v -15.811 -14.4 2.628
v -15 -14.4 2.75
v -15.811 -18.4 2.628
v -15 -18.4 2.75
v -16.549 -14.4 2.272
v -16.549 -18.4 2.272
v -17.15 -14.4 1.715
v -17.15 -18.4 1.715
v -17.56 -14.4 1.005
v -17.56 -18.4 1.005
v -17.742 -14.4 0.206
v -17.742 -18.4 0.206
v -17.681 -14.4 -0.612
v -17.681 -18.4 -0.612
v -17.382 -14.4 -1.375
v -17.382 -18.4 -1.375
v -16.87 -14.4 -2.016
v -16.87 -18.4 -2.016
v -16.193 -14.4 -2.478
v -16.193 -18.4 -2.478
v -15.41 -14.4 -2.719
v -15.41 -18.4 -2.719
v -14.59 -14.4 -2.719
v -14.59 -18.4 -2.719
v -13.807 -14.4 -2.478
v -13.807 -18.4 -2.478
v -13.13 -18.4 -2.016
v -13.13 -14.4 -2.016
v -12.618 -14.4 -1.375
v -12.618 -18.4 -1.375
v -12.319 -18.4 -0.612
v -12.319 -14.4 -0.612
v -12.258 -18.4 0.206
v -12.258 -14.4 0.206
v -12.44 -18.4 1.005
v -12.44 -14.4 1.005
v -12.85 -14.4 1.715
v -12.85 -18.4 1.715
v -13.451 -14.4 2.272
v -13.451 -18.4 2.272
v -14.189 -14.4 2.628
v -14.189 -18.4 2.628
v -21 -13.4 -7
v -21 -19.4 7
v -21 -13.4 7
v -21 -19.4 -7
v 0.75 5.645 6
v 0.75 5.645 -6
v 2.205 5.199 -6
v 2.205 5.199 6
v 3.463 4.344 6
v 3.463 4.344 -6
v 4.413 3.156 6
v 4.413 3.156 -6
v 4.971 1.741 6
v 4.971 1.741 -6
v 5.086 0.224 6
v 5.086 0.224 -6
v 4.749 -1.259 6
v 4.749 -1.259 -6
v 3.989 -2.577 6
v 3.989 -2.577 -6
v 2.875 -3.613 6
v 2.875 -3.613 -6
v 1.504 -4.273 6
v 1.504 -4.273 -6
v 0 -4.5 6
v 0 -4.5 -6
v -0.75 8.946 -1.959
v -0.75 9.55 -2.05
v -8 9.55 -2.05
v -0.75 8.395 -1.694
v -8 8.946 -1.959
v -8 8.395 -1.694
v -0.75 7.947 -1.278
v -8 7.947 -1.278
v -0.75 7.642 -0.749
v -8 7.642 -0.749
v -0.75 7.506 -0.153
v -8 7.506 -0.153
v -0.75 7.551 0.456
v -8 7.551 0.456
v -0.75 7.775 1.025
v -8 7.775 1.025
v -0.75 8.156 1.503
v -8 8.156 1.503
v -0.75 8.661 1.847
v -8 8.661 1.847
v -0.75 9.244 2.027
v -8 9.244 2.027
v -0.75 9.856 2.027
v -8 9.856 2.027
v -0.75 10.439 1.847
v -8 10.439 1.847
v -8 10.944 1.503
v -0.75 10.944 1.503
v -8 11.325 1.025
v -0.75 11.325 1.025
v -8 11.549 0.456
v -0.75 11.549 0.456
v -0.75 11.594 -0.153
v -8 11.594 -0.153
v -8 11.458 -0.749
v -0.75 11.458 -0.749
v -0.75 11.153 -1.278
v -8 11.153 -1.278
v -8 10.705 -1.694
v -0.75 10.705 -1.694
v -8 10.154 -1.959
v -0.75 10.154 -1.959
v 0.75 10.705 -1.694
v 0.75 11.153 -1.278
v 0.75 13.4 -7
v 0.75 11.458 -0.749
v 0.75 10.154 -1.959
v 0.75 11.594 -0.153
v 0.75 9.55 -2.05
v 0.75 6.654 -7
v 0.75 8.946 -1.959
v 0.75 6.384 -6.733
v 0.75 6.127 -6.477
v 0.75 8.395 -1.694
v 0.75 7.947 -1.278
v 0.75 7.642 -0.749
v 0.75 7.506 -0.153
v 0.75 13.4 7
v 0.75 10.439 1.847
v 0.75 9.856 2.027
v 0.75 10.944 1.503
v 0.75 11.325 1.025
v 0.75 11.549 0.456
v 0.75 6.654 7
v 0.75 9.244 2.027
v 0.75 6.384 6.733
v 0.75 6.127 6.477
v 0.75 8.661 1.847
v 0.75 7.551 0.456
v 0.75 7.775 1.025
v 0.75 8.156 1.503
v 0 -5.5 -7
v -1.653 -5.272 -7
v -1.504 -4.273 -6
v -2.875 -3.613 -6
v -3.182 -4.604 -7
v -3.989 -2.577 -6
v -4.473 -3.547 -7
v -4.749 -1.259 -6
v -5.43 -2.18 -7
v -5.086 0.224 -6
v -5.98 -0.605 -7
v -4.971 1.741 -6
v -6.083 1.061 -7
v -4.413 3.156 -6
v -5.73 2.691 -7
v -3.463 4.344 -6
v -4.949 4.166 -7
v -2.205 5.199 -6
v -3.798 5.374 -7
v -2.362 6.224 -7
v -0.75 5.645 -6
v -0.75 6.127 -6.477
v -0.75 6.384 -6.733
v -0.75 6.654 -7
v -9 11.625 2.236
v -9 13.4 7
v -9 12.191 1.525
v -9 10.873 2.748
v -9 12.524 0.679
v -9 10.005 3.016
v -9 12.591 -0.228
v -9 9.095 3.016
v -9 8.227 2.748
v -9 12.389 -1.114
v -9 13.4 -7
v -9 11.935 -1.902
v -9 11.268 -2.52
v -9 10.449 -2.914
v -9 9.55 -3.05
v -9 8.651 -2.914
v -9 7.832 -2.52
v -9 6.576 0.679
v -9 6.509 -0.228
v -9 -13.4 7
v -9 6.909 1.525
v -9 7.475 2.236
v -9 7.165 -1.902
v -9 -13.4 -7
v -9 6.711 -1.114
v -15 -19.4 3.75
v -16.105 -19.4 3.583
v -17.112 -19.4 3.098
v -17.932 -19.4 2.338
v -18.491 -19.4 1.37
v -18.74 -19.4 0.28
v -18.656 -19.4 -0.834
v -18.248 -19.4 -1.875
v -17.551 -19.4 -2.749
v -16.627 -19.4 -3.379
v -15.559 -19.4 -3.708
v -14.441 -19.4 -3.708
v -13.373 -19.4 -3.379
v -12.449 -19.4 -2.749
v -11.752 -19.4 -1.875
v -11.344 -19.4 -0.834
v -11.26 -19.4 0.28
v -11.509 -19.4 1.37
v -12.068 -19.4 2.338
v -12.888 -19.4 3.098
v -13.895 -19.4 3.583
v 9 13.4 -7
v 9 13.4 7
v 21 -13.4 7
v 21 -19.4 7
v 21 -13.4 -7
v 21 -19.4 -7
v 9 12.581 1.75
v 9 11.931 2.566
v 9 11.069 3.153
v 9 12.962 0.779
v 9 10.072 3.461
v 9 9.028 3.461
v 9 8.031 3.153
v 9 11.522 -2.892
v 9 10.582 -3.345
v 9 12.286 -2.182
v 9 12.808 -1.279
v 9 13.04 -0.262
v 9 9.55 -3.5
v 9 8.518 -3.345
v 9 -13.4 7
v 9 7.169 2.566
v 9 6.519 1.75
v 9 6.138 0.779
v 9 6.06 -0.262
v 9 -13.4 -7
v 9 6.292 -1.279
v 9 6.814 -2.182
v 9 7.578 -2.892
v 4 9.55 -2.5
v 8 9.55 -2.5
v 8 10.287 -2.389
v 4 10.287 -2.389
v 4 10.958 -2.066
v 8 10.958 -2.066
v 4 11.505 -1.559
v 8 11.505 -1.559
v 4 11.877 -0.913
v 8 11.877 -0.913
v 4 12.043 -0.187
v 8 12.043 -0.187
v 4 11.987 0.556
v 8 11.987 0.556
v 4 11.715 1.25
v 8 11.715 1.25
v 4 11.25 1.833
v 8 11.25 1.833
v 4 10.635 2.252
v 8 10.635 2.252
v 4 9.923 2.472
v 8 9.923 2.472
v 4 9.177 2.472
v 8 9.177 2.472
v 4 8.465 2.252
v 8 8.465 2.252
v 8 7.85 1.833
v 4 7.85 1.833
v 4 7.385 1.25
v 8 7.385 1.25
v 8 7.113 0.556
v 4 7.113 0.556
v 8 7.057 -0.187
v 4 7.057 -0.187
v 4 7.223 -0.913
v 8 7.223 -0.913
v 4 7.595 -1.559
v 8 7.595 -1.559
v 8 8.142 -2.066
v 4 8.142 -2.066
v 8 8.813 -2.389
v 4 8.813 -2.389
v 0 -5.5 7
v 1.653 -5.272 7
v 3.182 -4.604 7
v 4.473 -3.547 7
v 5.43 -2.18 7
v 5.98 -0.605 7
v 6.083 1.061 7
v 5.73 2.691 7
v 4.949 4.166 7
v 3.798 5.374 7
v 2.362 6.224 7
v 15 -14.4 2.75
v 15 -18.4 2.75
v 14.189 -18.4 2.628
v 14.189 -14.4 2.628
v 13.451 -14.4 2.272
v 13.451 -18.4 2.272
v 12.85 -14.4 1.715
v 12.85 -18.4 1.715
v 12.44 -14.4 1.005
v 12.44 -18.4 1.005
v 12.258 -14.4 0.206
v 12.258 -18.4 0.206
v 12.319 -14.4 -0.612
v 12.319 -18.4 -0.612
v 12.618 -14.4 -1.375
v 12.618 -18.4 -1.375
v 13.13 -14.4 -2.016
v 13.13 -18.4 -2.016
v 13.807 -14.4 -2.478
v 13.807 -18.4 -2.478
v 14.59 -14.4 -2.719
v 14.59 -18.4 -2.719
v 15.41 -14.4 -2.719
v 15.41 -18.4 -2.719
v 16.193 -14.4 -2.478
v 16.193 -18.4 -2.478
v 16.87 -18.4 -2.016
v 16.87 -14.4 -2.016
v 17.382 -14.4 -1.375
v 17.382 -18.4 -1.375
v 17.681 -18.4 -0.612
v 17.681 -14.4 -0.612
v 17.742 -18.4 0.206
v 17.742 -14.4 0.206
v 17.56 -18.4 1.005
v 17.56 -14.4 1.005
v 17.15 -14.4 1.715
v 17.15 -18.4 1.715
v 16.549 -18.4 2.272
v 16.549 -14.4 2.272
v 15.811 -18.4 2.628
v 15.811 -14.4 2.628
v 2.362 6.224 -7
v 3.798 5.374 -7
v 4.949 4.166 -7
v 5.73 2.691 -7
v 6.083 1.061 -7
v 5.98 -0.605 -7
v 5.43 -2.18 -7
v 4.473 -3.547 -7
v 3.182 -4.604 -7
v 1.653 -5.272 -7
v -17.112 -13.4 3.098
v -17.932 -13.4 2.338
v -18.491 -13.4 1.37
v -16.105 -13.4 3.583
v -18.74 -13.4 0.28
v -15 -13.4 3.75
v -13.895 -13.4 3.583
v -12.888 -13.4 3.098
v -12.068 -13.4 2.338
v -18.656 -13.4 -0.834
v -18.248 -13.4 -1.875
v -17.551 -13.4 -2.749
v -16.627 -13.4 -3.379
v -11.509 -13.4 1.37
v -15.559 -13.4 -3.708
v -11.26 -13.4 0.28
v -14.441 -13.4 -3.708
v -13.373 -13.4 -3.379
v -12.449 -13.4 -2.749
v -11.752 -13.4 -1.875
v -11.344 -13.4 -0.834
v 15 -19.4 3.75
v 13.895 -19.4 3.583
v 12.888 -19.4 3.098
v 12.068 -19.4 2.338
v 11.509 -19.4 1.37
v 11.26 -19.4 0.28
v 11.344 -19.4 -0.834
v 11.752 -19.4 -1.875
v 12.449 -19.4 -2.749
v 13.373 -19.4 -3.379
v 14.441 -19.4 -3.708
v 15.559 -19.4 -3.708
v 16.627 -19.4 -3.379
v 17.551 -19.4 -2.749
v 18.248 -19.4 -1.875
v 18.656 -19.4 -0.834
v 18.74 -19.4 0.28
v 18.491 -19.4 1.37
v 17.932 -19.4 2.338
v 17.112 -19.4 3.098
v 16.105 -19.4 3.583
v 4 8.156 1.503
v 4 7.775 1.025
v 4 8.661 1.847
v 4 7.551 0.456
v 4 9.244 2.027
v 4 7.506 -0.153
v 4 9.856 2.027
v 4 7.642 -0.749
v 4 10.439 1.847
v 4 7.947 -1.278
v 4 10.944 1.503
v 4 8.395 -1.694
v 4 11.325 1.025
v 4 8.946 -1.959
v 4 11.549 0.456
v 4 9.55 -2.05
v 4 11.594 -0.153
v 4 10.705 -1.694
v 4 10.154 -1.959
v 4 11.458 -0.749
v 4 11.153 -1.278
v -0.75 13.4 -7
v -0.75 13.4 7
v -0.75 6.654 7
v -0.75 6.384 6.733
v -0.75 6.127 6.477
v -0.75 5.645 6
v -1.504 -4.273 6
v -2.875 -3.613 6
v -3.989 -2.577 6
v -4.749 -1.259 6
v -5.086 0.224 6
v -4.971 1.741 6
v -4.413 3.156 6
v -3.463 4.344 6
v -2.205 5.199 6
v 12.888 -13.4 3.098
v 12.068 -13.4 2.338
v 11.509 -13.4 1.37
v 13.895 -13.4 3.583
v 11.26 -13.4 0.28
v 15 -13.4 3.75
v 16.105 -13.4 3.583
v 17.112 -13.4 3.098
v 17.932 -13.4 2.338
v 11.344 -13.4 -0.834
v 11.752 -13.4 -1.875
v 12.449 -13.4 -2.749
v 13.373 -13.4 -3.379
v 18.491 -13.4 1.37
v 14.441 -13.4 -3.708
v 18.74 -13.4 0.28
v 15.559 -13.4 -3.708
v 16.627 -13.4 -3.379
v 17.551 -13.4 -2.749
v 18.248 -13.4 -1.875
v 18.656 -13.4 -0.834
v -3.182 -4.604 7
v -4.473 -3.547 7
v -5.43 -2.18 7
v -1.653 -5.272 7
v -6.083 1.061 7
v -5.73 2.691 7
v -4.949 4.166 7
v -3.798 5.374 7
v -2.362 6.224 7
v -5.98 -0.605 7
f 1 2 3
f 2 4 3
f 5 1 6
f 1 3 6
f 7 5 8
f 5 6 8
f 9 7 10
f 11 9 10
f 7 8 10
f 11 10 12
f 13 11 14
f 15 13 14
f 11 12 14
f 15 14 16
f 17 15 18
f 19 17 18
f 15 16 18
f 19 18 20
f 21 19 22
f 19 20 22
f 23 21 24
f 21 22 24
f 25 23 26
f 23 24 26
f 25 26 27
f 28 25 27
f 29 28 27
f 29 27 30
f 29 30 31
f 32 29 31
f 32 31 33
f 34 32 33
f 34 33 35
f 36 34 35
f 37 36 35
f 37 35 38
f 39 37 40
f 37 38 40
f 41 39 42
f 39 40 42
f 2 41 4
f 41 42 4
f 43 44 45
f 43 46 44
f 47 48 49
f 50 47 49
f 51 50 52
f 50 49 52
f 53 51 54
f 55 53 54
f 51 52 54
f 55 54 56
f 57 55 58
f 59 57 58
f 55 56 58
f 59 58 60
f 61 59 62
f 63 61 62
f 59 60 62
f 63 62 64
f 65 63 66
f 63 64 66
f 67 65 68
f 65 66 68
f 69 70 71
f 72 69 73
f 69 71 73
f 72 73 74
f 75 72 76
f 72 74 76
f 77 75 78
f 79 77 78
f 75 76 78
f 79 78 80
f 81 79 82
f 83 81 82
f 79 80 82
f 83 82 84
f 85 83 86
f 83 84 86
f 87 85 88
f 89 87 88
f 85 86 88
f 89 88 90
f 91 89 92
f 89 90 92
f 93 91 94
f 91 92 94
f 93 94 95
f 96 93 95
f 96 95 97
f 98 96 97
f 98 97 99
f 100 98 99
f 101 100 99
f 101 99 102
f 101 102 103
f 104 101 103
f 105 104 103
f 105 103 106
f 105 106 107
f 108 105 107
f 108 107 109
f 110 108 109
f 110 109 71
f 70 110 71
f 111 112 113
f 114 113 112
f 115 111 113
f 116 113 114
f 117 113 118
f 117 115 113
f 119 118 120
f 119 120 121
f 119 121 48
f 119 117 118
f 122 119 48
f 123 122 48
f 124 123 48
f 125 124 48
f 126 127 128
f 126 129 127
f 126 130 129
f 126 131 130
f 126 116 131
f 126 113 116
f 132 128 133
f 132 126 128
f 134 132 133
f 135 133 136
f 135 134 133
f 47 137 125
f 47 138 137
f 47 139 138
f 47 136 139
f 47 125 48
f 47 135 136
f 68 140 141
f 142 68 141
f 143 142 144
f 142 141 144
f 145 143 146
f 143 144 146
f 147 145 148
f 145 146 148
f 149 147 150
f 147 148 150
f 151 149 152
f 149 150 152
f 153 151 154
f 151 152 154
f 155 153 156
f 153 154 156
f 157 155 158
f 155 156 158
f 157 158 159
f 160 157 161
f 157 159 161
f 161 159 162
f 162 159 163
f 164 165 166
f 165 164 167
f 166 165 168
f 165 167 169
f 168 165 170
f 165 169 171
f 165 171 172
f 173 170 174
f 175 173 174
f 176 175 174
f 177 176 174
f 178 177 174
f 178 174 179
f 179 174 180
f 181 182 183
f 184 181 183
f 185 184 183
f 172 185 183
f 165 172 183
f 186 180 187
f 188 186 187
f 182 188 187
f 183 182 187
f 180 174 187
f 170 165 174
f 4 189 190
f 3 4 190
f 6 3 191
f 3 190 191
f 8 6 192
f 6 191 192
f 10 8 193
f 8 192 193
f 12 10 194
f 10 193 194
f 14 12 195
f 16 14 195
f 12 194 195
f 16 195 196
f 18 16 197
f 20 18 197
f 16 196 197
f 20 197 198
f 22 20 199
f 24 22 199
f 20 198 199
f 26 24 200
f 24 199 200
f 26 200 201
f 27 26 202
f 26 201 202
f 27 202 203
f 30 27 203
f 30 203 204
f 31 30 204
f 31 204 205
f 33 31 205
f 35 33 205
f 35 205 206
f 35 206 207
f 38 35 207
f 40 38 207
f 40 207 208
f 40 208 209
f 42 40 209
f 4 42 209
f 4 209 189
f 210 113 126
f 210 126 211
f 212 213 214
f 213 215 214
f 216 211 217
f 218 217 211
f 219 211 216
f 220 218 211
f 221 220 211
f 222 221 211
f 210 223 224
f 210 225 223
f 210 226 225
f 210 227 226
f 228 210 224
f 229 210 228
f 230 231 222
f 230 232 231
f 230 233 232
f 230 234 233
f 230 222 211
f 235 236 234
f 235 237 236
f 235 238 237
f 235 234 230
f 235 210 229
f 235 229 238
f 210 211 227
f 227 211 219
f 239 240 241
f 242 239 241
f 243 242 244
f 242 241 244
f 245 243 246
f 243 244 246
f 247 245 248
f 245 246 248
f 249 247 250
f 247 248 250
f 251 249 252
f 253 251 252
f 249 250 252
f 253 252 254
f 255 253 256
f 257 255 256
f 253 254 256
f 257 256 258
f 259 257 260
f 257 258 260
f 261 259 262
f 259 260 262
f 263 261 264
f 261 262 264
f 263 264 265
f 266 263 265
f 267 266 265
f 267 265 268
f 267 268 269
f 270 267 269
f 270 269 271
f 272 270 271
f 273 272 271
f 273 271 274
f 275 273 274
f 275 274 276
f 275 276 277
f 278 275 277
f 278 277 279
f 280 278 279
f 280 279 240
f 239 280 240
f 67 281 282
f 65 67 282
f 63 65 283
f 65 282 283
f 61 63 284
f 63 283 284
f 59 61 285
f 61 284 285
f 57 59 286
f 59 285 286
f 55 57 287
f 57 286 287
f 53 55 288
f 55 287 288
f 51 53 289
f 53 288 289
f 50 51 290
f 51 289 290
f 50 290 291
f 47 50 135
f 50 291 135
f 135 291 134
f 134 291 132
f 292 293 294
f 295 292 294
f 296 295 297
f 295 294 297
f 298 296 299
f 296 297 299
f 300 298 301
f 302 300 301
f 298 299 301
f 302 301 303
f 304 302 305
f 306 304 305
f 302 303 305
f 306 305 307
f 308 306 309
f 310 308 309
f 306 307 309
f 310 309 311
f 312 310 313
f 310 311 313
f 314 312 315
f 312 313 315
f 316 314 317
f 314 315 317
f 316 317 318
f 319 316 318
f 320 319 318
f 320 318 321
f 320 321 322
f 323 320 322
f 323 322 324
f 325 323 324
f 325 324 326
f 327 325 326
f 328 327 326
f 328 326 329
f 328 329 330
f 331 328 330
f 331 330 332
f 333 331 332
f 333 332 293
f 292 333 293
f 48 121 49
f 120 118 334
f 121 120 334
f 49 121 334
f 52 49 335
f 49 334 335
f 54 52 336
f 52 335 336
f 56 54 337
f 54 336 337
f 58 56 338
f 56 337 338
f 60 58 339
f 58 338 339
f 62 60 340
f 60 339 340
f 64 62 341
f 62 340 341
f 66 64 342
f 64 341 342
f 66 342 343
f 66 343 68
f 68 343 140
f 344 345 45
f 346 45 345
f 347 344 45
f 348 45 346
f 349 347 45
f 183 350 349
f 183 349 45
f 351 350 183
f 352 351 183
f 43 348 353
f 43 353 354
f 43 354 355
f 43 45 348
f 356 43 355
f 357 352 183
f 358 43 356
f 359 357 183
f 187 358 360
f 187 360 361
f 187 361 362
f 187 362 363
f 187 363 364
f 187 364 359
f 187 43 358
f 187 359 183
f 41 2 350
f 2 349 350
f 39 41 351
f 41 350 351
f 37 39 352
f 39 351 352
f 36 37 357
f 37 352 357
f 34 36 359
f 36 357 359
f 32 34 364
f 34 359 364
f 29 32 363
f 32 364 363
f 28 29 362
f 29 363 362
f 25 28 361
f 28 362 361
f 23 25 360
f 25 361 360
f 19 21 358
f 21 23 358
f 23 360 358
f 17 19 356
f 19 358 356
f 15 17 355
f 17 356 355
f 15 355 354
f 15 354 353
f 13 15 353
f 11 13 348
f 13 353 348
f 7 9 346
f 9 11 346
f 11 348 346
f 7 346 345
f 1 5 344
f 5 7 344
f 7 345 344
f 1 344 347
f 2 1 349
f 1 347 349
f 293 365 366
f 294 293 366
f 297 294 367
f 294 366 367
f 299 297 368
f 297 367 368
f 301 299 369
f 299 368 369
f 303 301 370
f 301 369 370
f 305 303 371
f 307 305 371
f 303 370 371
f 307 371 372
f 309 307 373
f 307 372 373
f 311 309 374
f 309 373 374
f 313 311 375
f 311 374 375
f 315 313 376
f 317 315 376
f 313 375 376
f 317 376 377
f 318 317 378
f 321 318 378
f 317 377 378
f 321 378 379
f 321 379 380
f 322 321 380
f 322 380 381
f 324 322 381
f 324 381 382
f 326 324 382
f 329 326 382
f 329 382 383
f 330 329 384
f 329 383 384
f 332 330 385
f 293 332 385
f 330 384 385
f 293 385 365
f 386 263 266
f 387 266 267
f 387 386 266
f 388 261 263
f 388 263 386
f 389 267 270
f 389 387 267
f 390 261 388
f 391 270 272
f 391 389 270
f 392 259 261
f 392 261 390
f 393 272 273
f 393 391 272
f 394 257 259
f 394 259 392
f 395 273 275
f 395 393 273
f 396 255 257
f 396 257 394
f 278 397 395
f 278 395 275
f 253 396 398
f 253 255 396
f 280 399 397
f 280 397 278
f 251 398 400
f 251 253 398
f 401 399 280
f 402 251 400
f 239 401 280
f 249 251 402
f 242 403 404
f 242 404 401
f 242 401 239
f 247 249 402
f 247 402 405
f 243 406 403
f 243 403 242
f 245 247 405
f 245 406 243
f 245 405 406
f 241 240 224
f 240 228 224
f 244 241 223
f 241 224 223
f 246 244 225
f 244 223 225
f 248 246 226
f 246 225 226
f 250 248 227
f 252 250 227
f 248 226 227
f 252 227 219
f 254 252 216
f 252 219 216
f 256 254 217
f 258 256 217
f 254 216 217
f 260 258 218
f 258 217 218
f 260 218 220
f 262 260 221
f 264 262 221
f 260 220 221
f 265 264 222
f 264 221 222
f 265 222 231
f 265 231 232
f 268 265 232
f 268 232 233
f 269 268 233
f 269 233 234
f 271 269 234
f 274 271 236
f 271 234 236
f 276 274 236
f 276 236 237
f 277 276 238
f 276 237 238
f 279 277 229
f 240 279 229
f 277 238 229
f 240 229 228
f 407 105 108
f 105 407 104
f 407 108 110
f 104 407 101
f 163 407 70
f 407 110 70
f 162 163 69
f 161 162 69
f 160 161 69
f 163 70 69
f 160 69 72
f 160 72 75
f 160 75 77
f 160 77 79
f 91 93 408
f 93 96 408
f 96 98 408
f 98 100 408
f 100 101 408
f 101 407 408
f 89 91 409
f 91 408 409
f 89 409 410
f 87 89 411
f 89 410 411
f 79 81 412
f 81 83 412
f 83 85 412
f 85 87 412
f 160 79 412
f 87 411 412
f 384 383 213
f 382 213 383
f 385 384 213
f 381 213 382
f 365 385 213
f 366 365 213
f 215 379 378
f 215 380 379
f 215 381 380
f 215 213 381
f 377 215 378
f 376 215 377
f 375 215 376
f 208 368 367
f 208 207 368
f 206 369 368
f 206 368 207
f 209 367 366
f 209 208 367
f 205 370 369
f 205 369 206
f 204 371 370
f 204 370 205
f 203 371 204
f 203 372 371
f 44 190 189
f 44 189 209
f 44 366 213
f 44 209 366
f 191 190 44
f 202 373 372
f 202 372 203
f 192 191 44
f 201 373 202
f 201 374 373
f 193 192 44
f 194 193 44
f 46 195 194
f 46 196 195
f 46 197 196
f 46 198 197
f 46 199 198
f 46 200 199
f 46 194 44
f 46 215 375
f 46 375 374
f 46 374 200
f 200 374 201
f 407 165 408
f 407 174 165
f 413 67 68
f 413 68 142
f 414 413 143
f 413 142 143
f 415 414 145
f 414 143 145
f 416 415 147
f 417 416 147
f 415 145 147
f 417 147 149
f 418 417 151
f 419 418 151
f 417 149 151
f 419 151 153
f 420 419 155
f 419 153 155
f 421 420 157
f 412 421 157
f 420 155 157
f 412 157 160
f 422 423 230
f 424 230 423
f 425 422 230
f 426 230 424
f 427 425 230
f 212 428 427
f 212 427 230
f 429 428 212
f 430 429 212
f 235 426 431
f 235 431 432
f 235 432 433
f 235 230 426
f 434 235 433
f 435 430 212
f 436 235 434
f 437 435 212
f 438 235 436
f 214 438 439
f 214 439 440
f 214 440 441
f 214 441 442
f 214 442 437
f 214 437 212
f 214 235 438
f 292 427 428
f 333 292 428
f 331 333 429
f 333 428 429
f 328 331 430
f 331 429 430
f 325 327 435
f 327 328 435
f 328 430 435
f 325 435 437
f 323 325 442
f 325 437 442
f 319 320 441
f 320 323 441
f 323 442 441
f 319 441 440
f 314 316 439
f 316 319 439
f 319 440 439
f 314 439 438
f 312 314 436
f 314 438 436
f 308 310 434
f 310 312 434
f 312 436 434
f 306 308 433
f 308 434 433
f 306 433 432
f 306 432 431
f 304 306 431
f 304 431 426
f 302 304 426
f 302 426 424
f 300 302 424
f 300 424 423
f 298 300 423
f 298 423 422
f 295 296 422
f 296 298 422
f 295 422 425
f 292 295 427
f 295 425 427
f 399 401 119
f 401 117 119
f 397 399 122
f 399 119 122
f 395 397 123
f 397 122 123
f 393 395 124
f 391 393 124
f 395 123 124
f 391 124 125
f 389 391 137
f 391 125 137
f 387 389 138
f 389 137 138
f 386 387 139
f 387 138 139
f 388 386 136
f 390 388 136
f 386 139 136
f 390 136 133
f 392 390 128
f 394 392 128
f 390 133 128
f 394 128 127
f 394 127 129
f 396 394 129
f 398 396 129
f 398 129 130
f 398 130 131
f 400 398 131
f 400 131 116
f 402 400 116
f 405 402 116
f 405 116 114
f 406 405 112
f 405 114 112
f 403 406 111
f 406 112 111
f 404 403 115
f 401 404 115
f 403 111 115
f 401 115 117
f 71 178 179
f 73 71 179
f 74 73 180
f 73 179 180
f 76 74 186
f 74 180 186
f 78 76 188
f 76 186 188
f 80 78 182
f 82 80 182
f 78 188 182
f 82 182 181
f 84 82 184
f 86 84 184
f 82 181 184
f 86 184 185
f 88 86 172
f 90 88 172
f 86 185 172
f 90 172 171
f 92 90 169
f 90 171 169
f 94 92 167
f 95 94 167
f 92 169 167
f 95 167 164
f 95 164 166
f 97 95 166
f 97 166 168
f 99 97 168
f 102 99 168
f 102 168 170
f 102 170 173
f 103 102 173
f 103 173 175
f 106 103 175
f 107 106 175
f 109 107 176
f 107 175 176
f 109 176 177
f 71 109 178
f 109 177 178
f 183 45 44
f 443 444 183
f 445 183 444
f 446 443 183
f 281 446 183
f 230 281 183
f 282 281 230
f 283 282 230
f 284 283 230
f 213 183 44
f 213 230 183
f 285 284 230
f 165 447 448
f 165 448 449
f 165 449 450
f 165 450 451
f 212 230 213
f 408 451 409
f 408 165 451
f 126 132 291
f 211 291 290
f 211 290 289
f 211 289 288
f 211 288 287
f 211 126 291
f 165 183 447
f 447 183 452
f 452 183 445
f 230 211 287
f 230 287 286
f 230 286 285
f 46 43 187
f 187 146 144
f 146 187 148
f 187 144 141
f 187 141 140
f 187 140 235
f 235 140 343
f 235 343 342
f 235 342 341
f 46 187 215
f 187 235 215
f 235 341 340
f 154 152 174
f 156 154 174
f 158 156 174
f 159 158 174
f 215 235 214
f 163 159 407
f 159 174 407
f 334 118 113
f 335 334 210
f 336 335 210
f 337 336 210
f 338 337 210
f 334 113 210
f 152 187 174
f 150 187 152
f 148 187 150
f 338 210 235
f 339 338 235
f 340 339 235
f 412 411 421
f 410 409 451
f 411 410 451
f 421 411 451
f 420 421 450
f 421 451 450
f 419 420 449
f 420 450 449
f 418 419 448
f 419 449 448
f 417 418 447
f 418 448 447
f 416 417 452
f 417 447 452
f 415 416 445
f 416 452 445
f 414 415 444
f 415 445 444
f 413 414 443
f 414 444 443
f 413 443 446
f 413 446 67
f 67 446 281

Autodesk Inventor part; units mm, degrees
ref_plane "YZ Plane" through (0, 0, 0) normal (1, 0, 0) x (0, 1, 0)
ref_plane "XZ Plane" through (0, 0, 0) normal (0, 1, 0) x (-1, 0, 0)
ref_plane "XY Plane" through (0, 0, 0) normal (0, 0, 1) x (1, 0, 0)
sketch "Эскиз1" plane through (0, 0, 0) normal (0, 0, 1) x (1, 0, 0)
  line L0 (-9, 13.4) -> (9, 13.4)
  line L1 (21, -19.4) -> (-21, -19.4)
  line L2 (-21, -19.4) -> (-21, -13.4)
  line L3 (-9, 13.4) -> (-9, -13.4)
  line L4 (9, 13.4) -> (9, -13.4)
  line L5 (21, -19.4) -> (21, -13.4)
  line L6 (-21, -13.4) -> (-9, -13.4)
  line L7 (9, -13.4) -> (21, -13.4)
  point P0 (0, 0)
  point P1 (-9, 0)
  point P2 (0, -19.4)
  dimension "d0" = 42
  dimension "d2" = 18
  dimension "d3" = 9
  dimension "d6" = 6
  dimension "d7" = 32.8
extrude "Выдавливание1" add sketch "Эскиз1" along normal mid plane 14
sketch "Эскиз3" plane through (0, 0, 7) normal (0, 0, 1) x (1, 0, 0)
  line L0 (-21, -19.4) -> (21, -19.4) projected
  point P0 (0, 0)
  point P1 (0, 0.6)
  dimension "d12" = 20
hole "Отверстие1" at (0, 0.6, 7) direction (0, 0, -1) diameter 10.2 end through all
sketch "Эскиз4" plane through (0, 0, 7) normal (0, 0, 1) x (1, 0, 0)
  line L0 (-9, 13.4) -> (9, 13.4) projected
  line L1 (-0.75, 13.4) -> (-0.75, 5.6446)
  circle A0 centre (0, 0.6) radius 5.1 projected
  line L2 (0.75, 13.4) -> (0.75, 5.6446)
  point P0 (0, 0)
  dimension "d20" = 1.5
  dimension "d21" = 0.75
extrude "Выдавливание2" cut sketch "Эскиз4" against normal blind 14 contours L0 L2 A0 L1
sketch "Эскиз6" plane through (9, -13.4, 7) normal (0, 1, 0) x (1, 0, 0)
  line L0 (12, 14) -> (12, 0) projected
  line L1 (0, 14) -> (12, 14) projected
  point P0 (-9, 7)
  point P1 (6, 7)
  point P2 (12, 7)
  point P3 (6, 14)
hole "Отверстие3" at (15, -13.4, 0) direction (0, -1, 0) diameter 5.5 end through all
sketch "Эскиз7" plane through (-21, -13.4, 7) normal (0, 1, 0) x (1, 0, 0)
  line L0 (0, 14) -> (12, 14) projected
  line L1 (0, 0) -> (0, 14) projected
  point P0 (21, 7)
  point P1 (6, 7)
  point P2 (6, 14)
  point P3 (0, 7)
hole "Отверстие4" at (-15, -13.4, 0) direction (0, -1, 0) diameter 5.5 end through all
sketch "Эскиз8" plane through (9, -13.4, 7) normal (1, 0, 0) x (0, 0, -1)
  line L0 (14, 26.8) -> (0, 26.8) projected
  point P0 (7, 13.4)
  point P1 (7, 22.95)
  point P2 (7, 26.8)
  dimension "d50" = 3.85
sketch "Эскиз9" plane through (9, -13.4, 7) normal (1, 0, 0) x (0, 0, -1)
  point P0 (7, 13.4)
hole "Отверстие5" at (9, 9.55, 0) direction (-1, 0, 0) diameter 4.1 end through all
thread "Резьба2" size "M4.5x0.75" class "6H" standard "ANSI Metric M Profile" full length
sketch "Эскиз10" plane through (9, -13.4, 7) normal (1, 0, 0) x (0, 0, -1)
  circle A0 centre (7, 22.95) radius 2.5
  line L0 (14, 26.8) -> (0, 26.8) projected
  point P0 (7, 13.4)
  point P1 (7, 26.8)
  dimension "d60" = 5
  dimension "d61" = 3.85
extrude "Выдавливание3" cut sketch "Эскиз10" against normal blind 5
chamfer "Фаска1" distance 1 angle 45 10 edges at (-5.0861, 0.224, 7) (5.0861, 0.224, 7) (-9, 9.55, 2.05) (-15, -19.4, -2.75) (15, -19.4, -2.75) (-5.0861, 0.224, -7) (5.0861, 0.224, -7) (15, -13.4, -2.75) (-15, -13.4, -2.75) (9, 9.55, 2.5)
properties part number "SK10"
